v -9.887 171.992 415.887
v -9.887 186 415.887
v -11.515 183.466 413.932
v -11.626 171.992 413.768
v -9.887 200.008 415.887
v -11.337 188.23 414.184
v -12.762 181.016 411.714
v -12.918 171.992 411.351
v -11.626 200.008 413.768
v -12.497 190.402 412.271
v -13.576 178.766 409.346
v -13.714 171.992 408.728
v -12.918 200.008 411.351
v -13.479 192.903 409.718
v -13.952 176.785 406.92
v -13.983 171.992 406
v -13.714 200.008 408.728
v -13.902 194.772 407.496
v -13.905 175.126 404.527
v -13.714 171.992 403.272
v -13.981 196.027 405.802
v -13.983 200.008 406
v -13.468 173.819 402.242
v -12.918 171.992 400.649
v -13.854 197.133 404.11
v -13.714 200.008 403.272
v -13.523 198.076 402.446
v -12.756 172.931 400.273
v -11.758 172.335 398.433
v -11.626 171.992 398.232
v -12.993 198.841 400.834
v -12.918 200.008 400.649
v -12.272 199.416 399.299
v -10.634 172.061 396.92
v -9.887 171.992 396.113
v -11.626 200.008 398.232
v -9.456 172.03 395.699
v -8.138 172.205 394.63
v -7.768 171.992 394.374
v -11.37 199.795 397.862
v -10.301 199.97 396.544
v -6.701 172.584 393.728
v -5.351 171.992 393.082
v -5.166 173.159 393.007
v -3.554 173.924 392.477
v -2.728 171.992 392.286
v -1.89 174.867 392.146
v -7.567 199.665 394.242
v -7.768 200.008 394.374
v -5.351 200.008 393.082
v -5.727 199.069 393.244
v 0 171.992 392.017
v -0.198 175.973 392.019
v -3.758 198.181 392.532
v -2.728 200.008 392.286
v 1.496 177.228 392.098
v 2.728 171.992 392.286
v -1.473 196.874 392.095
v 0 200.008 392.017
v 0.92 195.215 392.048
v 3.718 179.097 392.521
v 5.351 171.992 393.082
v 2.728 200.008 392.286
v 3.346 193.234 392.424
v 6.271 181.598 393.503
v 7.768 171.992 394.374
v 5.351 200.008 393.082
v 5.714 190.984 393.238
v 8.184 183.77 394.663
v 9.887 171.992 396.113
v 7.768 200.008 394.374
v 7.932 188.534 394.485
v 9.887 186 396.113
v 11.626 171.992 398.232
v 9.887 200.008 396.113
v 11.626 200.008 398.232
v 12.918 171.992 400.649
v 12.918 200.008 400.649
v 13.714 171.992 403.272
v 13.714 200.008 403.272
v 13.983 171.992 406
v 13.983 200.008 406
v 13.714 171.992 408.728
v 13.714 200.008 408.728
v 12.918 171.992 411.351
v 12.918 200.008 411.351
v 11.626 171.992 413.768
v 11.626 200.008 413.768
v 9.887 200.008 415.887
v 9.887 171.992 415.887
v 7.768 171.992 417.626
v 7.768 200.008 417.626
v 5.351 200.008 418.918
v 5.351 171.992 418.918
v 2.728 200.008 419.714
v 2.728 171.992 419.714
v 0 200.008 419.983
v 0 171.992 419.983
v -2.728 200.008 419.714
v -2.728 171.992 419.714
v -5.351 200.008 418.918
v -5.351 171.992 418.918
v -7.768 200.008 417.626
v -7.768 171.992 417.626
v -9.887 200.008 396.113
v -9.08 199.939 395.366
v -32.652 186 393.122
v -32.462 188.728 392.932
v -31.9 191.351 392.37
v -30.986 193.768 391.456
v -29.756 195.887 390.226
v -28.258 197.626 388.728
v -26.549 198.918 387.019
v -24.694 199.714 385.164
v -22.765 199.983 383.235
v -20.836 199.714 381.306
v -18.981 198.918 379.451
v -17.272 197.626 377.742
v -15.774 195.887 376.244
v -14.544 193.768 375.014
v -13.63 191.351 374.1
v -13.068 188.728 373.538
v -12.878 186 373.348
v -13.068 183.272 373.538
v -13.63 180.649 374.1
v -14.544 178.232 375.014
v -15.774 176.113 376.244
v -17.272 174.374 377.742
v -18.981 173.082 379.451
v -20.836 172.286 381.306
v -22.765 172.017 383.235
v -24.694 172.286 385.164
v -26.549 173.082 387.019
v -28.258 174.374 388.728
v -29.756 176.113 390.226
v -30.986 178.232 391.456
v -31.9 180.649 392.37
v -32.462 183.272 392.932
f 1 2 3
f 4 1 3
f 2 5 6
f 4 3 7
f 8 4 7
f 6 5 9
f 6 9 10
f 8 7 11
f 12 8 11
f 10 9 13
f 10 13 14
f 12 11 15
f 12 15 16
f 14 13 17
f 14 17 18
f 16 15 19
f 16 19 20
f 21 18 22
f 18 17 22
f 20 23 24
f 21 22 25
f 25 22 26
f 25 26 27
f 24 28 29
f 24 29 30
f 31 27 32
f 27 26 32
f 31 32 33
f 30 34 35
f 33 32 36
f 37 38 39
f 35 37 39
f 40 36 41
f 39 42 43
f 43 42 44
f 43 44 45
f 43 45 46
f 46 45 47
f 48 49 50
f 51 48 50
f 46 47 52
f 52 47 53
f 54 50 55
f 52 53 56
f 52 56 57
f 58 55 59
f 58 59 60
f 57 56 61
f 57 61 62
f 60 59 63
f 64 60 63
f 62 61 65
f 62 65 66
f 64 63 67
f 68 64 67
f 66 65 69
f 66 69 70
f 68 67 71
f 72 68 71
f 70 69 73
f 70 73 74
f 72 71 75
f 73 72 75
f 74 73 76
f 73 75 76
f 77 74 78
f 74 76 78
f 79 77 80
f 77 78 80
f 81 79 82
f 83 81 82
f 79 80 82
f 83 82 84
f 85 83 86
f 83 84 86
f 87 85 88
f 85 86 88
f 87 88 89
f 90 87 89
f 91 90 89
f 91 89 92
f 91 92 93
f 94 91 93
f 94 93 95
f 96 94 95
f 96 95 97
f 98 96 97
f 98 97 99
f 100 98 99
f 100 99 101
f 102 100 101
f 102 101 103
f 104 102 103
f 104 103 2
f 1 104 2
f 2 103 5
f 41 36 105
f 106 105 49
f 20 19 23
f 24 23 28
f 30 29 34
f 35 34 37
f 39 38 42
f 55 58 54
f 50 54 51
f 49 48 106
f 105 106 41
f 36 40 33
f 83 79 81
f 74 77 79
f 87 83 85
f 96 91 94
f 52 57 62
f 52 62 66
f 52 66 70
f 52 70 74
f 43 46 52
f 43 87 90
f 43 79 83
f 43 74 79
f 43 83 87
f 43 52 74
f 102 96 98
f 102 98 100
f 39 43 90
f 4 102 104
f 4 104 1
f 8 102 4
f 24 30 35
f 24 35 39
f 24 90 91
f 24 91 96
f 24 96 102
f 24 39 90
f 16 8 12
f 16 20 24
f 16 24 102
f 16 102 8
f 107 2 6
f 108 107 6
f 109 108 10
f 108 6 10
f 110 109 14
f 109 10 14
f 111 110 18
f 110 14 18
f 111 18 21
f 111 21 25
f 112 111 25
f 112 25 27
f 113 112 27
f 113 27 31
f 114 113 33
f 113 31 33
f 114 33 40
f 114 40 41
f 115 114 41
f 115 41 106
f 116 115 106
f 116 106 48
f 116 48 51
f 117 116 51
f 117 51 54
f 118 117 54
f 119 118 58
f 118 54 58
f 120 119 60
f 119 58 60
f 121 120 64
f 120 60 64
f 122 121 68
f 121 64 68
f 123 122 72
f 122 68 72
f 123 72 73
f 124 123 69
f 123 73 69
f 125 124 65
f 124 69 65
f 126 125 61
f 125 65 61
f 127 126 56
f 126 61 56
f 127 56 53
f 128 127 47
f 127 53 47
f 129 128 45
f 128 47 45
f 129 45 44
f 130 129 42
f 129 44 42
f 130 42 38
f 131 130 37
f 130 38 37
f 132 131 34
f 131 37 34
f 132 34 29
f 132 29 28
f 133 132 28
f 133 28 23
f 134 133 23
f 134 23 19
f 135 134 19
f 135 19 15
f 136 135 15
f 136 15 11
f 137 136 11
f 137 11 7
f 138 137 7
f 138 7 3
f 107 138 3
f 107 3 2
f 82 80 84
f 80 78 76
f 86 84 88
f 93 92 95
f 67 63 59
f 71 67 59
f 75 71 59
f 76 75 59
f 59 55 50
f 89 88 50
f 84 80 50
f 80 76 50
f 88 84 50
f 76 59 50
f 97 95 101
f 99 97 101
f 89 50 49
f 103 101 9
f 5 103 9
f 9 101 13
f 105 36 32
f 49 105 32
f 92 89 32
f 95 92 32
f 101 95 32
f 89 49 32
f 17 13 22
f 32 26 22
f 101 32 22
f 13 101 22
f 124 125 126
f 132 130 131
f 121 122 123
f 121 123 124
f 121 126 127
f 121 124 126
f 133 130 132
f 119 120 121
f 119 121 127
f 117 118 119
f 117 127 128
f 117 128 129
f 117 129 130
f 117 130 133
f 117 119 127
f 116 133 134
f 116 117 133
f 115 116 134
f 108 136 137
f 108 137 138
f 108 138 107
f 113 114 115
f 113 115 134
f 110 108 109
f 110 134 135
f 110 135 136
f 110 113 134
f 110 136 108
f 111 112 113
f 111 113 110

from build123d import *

# Parameters (mm, degrees)
CYLINDER046_R             = 13.9827
CYLINDER046_DEPTH         = 28.0162
CYLINDER045_R             = 13.9827
CYLINDER045_DEPTH         = 32.1945
FUSION018_PLACEMENT_ANGLE = 225


with BuildPart() as cylinder046:
    # Cylinder046 → Cylinder046 (new body)
    with BuildSketch(Plane.XZ.offset(-14.0081)):
        Circle(CYLINDER046_R)
    extrude(amount=CYLINDER046_DEPTH)


with BuildPart() as middle_inner_slip_r:
    # Cylinder045 → Cylinder045 (new body)
    with BuildSketch(Plane.XY):
        Circle(CYLINDER045_R)
    extrude(amount=CYLINDER045_DEPTH)

    # Fusion018: union Cylinder046
    add(cylinder046.part)


with BuildPart() as middle_inner_slip_r_1:
    # Fusion018 placement: moved
    add(middle_inner_slip_r.part.moved(Location((0, 186, 406))).rotate(Axis((0, 186, 406), (0, 1, 0)), FUSION018_PLACEMENT_ANGLE))


solid = middle_inner_slip_r_1.part
